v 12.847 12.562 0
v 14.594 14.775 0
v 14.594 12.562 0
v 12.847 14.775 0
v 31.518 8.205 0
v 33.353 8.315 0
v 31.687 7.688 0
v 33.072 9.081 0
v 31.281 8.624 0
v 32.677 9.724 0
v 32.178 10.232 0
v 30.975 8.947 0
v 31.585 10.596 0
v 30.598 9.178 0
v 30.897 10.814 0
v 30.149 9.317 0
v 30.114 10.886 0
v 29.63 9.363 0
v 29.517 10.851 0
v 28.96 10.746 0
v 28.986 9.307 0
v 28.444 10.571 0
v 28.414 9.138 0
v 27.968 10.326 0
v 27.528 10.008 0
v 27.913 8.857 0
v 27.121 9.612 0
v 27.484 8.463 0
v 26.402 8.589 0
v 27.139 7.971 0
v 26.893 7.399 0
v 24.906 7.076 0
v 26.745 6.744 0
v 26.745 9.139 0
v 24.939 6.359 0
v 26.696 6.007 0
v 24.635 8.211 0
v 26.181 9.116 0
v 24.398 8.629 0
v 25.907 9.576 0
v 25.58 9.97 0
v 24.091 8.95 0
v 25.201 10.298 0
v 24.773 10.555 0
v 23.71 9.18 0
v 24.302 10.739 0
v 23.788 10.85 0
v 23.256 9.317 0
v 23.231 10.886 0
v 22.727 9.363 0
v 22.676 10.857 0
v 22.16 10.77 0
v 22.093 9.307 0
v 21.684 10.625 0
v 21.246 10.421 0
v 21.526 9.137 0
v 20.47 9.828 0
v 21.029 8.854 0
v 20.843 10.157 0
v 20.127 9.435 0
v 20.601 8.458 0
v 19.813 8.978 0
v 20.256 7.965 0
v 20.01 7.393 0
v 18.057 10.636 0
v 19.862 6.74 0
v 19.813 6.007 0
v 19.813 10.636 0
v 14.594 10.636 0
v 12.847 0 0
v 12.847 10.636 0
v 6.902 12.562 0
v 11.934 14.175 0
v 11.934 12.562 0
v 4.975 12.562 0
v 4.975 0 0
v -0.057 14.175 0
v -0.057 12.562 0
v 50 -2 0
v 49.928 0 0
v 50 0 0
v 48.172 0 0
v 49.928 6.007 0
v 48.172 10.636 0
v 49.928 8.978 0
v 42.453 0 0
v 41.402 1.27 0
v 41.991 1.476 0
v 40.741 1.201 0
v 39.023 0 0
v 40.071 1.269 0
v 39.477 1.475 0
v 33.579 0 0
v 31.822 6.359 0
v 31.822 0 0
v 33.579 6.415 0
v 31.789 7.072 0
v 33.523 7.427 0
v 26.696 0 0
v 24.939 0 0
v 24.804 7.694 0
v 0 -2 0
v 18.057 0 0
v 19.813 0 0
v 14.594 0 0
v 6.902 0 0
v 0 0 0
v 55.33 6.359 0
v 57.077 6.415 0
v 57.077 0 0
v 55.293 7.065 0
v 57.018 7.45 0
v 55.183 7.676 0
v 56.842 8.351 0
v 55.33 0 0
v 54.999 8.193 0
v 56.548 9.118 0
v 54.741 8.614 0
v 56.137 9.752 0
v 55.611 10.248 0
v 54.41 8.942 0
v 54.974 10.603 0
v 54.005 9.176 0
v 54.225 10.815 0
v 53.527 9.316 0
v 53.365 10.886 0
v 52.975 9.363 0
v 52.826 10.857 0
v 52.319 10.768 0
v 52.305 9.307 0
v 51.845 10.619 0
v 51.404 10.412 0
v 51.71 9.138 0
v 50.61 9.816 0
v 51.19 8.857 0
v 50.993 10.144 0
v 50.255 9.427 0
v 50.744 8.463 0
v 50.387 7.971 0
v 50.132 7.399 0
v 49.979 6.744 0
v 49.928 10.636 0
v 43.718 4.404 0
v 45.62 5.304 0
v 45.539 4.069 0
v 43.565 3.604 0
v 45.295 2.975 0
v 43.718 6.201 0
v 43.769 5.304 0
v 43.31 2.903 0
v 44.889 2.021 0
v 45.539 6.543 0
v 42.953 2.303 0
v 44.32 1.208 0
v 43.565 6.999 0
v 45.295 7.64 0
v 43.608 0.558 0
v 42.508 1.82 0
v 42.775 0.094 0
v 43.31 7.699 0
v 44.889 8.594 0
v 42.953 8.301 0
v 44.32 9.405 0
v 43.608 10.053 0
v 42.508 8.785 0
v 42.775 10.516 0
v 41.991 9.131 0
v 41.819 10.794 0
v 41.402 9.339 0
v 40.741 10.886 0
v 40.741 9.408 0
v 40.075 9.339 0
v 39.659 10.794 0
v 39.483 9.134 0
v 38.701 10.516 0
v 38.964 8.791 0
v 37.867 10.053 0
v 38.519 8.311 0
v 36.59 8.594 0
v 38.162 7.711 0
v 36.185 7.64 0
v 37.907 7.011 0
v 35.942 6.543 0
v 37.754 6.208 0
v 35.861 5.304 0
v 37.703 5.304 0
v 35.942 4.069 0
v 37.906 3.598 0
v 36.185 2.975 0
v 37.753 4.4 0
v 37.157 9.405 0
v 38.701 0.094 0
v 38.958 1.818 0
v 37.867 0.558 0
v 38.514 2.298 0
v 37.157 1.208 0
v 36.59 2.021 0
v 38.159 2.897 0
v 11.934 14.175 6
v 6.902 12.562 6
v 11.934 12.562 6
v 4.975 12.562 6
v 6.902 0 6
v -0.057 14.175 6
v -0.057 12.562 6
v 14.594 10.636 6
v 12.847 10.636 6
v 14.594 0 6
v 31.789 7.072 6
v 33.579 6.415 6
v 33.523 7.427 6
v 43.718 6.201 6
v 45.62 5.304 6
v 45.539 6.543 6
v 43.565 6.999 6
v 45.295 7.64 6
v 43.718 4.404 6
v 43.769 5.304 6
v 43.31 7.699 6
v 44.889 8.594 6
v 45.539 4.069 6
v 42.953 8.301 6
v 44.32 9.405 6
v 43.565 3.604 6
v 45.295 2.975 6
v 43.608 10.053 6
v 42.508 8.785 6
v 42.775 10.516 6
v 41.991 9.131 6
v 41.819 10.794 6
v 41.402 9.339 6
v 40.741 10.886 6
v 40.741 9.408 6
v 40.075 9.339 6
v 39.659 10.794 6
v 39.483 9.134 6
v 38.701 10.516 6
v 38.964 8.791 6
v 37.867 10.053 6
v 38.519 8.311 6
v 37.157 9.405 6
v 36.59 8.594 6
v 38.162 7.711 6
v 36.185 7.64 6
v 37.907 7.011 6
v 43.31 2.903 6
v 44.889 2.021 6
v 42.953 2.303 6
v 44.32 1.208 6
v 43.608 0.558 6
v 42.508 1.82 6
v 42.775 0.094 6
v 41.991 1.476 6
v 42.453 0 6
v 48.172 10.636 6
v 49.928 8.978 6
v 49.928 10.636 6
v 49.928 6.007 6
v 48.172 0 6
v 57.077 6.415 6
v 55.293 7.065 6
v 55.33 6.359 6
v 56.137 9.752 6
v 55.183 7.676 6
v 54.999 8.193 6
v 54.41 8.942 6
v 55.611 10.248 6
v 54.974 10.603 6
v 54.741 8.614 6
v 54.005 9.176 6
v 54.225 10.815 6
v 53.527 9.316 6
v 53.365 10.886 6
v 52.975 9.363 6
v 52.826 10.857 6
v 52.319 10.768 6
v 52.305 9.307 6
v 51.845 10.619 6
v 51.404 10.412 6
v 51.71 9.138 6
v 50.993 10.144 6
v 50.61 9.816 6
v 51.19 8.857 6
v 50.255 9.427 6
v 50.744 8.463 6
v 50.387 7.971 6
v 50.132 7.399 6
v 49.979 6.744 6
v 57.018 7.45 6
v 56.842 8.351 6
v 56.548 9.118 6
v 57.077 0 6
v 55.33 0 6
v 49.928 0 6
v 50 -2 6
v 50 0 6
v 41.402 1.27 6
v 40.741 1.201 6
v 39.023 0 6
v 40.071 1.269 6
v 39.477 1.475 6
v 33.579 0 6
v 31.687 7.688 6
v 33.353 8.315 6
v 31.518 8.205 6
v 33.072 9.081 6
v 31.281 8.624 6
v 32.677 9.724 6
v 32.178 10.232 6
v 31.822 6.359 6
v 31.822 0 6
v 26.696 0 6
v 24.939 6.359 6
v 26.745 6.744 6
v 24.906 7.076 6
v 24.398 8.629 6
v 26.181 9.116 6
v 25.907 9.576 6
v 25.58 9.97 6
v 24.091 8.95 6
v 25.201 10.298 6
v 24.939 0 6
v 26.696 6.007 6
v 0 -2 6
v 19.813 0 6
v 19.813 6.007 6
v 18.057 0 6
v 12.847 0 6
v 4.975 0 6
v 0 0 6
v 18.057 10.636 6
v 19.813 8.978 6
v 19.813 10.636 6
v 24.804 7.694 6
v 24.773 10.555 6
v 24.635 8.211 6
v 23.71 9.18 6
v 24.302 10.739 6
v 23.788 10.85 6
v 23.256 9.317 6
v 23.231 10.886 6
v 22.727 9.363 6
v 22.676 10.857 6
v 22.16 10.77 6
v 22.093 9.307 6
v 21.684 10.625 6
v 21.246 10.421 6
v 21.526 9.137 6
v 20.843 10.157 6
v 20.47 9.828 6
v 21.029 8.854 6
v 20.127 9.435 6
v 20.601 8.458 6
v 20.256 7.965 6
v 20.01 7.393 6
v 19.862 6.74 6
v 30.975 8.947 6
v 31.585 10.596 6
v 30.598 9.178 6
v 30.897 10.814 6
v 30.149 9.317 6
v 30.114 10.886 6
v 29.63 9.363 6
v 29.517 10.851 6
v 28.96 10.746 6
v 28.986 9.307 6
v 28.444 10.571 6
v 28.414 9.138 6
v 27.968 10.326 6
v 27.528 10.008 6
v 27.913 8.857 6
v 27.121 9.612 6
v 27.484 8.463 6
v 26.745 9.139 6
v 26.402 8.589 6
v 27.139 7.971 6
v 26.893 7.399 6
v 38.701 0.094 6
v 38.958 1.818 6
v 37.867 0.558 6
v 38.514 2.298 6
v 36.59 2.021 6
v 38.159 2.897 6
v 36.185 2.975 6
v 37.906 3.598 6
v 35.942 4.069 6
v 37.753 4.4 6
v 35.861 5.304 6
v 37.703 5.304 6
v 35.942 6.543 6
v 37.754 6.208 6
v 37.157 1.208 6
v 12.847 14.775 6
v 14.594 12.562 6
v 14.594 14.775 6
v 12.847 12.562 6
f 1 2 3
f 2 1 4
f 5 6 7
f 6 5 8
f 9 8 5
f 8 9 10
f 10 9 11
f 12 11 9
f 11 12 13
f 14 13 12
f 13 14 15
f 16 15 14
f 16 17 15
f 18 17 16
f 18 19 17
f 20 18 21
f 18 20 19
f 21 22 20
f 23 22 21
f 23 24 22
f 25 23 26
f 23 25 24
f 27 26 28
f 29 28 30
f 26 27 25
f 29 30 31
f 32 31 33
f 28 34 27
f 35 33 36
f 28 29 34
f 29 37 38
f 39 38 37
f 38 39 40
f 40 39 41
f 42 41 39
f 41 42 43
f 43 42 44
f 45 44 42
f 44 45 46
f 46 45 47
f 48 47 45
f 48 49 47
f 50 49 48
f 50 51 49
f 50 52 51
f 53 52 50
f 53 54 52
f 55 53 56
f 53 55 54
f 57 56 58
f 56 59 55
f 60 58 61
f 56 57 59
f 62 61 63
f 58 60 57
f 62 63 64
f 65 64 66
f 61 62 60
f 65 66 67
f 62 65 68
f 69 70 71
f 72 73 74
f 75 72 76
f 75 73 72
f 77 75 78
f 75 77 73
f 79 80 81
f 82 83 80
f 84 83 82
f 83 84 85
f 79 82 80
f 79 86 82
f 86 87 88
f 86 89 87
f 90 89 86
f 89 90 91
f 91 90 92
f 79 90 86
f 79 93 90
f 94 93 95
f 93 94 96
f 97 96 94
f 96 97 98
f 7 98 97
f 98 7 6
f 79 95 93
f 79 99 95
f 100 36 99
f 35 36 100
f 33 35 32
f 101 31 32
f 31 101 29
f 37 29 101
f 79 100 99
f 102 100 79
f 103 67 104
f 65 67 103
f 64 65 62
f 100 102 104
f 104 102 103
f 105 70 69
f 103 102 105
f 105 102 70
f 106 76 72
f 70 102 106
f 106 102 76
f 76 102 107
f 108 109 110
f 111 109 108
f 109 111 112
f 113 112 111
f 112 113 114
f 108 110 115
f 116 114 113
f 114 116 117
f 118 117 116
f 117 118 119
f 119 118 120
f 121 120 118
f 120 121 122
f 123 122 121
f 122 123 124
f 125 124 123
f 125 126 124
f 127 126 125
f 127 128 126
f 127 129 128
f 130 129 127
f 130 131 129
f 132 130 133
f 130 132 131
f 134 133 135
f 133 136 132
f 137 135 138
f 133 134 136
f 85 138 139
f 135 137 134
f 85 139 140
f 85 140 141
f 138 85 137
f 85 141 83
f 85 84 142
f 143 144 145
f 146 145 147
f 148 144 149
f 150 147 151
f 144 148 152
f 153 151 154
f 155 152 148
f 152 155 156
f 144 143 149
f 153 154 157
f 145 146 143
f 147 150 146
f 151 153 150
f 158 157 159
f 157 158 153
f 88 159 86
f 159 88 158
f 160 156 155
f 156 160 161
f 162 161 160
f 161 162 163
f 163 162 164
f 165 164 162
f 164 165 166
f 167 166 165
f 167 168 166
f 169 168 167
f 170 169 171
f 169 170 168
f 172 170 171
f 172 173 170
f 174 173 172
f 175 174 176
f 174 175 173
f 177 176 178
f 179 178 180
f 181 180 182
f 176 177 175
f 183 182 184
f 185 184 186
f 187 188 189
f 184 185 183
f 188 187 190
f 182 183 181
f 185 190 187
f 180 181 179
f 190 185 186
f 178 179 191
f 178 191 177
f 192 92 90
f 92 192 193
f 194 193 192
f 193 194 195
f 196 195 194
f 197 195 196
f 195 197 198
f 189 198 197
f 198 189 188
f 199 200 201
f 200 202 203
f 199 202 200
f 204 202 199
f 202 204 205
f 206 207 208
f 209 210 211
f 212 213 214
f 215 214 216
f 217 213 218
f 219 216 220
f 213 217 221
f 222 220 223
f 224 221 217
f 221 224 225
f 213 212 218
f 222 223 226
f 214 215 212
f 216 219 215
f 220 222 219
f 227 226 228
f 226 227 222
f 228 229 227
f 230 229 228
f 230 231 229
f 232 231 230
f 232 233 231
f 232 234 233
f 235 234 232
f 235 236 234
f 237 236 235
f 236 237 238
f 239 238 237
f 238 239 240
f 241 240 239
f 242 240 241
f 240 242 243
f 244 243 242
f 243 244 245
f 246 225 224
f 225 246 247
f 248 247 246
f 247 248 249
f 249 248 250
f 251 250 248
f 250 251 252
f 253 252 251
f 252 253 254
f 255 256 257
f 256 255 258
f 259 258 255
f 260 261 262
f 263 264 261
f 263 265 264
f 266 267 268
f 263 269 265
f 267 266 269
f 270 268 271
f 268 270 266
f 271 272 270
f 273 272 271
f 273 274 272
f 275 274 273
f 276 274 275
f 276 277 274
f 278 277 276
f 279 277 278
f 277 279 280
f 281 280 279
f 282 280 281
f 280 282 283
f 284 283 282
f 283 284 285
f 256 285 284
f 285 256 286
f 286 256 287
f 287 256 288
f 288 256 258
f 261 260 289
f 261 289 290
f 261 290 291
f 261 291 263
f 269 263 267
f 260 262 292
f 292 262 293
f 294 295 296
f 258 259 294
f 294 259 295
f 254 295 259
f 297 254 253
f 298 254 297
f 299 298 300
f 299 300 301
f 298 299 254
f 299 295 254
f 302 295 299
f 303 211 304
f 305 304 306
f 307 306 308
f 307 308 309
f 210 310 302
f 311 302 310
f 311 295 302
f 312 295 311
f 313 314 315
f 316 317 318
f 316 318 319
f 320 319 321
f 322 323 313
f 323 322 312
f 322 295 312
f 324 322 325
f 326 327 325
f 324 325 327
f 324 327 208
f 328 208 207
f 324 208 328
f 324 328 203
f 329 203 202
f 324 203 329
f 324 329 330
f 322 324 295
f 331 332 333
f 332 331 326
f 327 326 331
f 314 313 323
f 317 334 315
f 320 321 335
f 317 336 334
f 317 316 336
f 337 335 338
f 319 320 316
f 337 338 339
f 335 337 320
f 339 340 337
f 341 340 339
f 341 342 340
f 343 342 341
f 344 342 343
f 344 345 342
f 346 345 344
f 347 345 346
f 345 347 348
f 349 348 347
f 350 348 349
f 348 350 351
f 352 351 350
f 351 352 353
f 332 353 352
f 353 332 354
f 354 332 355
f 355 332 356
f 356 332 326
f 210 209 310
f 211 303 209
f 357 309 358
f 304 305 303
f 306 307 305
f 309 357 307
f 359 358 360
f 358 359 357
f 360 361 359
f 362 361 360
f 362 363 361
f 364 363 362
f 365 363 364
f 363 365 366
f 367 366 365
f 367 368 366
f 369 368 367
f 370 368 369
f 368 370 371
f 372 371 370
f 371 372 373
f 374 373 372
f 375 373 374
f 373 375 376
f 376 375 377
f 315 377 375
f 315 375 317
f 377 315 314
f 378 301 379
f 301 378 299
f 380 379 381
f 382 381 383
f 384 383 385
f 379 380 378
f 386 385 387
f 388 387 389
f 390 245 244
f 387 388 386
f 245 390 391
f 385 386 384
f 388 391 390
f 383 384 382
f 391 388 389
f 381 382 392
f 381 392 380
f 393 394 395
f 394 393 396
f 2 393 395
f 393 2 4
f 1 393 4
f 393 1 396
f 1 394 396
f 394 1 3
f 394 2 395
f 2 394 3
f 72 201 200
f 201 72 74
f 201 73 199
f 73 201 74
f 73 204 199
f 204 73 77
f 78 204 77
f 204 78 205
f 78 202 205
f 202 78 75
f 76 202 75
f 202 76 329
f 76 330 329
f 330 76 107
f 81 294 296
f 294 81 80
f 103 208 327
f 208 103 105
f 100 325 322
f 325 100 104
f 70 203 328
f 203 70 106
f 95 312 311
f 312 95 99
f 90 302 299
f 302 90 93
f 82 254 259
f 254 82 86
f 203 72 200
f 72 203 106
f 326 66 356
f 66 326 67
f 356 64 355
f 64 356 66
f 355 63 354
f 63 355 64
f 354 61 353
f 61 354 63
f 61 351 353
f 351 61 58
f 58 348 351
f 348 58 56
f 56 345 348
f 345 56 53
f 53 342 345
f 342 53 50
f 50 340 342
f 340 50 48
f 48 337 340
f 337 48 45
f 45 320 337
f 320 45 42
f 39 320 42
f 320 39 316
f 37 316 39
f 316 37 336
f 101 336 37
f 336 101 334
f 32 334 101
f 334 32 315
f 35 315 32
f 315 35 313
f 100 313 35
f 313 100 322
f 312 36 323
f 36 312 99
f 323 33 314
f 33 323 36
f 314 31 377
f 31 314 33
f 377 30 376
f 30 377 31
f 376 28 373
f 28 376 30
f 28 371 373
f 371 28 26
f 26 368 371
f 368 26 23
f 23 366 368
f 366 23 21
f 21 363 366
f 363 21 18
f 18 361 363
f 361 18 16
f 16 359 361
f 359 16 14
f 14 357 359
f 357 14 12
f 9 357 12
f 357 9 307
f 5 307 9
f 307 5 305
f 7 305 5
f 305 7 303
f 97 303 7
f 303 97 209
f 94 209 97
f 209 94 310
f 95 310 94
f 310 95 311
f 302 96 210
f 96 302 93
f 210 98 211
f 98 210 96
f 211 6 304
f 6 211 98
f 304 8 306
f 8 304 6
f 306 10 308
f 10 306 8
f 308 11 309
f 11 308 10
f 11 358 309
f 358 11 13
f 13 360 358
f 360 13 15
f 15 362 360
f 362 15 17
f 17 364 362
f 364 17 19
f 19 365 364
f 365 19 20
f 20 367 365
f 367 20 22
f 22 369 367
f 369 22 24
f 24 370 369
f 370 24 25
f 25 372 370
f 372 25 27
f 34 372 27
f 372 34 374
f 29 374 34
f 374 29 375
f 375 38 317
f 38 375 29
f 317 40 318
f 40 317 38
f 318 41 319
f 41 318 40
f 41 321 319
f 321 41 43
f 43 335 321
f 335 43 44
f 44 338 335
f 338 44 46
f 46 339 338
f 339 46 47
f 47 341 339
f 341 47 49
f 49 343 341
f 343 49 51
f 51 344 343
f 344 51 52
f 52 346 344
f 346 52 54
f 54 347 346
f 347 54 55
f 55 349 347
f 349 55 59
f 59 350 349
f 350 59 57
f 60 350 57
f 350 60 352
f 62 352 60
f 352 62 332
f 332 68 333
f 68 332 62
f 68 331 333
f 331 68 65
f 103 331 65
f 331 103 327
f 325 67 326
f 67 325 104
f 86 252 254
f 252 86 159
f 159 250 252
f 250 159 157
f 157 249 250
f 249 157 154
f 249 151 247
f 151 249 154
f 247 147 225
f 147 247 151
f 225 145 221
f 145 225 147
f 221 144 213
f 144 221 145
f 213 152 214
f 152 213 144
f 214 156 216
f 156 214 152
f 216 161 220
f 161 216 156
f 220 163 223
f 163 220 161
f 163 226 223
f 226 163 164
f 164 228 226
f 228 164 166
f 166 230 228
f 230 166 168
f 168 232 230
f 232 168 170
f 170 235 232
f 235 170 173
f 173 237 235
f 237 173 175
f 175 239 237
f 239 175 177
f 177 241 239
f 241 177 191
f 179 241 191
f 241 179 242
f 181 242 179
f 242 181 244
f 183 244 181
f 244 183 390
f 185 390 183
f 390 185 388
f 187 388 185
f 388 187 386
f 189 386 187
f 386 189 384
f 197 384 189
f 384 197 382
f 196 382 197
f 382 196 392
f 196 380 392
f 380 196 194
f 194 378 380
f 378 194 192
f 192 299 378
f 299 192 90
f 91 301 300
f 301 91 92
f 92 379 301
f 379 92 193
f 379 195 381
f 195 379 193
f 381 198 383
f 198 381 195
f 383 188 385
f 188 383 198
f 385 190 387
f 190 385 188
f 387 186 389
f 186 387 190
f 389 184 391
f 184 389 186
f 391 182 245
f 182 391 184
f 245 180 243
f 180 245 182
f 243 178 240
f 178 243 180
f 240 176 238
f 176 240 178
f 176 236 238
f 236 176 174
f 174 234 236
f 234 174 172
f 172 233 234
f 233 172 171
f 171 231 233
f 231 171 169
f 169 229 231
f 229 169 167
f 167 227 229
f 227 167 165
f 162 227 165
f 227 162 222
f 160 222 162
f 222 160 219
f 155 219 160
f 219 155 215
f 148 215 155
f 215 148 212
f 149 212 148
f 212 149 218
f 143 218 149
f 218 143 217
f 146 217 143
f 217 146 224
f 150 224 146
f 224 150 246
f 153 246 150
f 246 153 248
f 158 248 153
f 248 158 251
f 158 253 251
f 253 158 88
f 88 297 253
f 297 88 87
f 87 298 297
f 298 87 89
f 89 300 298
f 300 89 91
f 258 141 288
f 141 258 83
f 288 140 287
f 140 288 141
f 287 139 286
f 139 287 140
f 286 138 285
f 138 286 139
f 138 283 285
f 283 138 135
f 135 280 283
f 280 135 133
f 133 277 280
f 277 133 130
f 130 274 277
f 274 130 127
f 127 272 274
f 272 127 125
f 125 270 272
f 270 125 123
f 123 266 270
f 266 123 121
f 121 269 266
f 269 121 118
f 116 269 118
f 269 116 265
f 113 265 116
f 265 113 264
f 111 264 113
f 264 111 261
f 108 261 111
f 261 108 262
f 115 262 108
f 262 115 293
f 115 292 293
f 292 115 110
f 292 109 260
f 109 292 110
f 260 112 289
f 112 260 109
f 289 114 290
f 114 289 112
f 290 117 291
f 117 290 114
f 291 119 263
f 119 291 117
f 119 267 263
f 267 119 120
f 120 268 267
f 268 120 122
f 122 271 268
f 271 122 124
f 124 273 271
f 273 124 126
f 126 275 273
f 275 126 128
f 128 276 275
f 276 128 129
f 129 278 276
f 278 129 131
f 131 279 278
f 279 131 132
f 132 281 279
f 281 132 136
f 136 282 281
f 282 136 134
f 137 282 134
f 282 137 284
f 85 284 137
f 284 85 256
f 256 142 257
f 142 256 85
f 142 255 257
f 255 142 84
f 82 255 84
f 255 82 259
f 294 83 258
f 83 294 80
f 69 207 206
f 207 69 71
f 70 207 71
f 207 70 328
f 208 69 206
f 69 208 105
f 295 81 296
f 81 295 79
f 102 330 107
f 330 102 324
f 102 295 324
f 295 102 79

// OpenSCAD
/*
 * Name writing (C) by Tobias Wilken
 *
 * Underlined to connect letters
 */

text = "Timon";
underline_length = 50;

linear_extrude(6) text(text, size=14, font="Deftone Stylus:style=Regular");
translate([0, -2, 0]) cube([underline_length, 2, 6]);
